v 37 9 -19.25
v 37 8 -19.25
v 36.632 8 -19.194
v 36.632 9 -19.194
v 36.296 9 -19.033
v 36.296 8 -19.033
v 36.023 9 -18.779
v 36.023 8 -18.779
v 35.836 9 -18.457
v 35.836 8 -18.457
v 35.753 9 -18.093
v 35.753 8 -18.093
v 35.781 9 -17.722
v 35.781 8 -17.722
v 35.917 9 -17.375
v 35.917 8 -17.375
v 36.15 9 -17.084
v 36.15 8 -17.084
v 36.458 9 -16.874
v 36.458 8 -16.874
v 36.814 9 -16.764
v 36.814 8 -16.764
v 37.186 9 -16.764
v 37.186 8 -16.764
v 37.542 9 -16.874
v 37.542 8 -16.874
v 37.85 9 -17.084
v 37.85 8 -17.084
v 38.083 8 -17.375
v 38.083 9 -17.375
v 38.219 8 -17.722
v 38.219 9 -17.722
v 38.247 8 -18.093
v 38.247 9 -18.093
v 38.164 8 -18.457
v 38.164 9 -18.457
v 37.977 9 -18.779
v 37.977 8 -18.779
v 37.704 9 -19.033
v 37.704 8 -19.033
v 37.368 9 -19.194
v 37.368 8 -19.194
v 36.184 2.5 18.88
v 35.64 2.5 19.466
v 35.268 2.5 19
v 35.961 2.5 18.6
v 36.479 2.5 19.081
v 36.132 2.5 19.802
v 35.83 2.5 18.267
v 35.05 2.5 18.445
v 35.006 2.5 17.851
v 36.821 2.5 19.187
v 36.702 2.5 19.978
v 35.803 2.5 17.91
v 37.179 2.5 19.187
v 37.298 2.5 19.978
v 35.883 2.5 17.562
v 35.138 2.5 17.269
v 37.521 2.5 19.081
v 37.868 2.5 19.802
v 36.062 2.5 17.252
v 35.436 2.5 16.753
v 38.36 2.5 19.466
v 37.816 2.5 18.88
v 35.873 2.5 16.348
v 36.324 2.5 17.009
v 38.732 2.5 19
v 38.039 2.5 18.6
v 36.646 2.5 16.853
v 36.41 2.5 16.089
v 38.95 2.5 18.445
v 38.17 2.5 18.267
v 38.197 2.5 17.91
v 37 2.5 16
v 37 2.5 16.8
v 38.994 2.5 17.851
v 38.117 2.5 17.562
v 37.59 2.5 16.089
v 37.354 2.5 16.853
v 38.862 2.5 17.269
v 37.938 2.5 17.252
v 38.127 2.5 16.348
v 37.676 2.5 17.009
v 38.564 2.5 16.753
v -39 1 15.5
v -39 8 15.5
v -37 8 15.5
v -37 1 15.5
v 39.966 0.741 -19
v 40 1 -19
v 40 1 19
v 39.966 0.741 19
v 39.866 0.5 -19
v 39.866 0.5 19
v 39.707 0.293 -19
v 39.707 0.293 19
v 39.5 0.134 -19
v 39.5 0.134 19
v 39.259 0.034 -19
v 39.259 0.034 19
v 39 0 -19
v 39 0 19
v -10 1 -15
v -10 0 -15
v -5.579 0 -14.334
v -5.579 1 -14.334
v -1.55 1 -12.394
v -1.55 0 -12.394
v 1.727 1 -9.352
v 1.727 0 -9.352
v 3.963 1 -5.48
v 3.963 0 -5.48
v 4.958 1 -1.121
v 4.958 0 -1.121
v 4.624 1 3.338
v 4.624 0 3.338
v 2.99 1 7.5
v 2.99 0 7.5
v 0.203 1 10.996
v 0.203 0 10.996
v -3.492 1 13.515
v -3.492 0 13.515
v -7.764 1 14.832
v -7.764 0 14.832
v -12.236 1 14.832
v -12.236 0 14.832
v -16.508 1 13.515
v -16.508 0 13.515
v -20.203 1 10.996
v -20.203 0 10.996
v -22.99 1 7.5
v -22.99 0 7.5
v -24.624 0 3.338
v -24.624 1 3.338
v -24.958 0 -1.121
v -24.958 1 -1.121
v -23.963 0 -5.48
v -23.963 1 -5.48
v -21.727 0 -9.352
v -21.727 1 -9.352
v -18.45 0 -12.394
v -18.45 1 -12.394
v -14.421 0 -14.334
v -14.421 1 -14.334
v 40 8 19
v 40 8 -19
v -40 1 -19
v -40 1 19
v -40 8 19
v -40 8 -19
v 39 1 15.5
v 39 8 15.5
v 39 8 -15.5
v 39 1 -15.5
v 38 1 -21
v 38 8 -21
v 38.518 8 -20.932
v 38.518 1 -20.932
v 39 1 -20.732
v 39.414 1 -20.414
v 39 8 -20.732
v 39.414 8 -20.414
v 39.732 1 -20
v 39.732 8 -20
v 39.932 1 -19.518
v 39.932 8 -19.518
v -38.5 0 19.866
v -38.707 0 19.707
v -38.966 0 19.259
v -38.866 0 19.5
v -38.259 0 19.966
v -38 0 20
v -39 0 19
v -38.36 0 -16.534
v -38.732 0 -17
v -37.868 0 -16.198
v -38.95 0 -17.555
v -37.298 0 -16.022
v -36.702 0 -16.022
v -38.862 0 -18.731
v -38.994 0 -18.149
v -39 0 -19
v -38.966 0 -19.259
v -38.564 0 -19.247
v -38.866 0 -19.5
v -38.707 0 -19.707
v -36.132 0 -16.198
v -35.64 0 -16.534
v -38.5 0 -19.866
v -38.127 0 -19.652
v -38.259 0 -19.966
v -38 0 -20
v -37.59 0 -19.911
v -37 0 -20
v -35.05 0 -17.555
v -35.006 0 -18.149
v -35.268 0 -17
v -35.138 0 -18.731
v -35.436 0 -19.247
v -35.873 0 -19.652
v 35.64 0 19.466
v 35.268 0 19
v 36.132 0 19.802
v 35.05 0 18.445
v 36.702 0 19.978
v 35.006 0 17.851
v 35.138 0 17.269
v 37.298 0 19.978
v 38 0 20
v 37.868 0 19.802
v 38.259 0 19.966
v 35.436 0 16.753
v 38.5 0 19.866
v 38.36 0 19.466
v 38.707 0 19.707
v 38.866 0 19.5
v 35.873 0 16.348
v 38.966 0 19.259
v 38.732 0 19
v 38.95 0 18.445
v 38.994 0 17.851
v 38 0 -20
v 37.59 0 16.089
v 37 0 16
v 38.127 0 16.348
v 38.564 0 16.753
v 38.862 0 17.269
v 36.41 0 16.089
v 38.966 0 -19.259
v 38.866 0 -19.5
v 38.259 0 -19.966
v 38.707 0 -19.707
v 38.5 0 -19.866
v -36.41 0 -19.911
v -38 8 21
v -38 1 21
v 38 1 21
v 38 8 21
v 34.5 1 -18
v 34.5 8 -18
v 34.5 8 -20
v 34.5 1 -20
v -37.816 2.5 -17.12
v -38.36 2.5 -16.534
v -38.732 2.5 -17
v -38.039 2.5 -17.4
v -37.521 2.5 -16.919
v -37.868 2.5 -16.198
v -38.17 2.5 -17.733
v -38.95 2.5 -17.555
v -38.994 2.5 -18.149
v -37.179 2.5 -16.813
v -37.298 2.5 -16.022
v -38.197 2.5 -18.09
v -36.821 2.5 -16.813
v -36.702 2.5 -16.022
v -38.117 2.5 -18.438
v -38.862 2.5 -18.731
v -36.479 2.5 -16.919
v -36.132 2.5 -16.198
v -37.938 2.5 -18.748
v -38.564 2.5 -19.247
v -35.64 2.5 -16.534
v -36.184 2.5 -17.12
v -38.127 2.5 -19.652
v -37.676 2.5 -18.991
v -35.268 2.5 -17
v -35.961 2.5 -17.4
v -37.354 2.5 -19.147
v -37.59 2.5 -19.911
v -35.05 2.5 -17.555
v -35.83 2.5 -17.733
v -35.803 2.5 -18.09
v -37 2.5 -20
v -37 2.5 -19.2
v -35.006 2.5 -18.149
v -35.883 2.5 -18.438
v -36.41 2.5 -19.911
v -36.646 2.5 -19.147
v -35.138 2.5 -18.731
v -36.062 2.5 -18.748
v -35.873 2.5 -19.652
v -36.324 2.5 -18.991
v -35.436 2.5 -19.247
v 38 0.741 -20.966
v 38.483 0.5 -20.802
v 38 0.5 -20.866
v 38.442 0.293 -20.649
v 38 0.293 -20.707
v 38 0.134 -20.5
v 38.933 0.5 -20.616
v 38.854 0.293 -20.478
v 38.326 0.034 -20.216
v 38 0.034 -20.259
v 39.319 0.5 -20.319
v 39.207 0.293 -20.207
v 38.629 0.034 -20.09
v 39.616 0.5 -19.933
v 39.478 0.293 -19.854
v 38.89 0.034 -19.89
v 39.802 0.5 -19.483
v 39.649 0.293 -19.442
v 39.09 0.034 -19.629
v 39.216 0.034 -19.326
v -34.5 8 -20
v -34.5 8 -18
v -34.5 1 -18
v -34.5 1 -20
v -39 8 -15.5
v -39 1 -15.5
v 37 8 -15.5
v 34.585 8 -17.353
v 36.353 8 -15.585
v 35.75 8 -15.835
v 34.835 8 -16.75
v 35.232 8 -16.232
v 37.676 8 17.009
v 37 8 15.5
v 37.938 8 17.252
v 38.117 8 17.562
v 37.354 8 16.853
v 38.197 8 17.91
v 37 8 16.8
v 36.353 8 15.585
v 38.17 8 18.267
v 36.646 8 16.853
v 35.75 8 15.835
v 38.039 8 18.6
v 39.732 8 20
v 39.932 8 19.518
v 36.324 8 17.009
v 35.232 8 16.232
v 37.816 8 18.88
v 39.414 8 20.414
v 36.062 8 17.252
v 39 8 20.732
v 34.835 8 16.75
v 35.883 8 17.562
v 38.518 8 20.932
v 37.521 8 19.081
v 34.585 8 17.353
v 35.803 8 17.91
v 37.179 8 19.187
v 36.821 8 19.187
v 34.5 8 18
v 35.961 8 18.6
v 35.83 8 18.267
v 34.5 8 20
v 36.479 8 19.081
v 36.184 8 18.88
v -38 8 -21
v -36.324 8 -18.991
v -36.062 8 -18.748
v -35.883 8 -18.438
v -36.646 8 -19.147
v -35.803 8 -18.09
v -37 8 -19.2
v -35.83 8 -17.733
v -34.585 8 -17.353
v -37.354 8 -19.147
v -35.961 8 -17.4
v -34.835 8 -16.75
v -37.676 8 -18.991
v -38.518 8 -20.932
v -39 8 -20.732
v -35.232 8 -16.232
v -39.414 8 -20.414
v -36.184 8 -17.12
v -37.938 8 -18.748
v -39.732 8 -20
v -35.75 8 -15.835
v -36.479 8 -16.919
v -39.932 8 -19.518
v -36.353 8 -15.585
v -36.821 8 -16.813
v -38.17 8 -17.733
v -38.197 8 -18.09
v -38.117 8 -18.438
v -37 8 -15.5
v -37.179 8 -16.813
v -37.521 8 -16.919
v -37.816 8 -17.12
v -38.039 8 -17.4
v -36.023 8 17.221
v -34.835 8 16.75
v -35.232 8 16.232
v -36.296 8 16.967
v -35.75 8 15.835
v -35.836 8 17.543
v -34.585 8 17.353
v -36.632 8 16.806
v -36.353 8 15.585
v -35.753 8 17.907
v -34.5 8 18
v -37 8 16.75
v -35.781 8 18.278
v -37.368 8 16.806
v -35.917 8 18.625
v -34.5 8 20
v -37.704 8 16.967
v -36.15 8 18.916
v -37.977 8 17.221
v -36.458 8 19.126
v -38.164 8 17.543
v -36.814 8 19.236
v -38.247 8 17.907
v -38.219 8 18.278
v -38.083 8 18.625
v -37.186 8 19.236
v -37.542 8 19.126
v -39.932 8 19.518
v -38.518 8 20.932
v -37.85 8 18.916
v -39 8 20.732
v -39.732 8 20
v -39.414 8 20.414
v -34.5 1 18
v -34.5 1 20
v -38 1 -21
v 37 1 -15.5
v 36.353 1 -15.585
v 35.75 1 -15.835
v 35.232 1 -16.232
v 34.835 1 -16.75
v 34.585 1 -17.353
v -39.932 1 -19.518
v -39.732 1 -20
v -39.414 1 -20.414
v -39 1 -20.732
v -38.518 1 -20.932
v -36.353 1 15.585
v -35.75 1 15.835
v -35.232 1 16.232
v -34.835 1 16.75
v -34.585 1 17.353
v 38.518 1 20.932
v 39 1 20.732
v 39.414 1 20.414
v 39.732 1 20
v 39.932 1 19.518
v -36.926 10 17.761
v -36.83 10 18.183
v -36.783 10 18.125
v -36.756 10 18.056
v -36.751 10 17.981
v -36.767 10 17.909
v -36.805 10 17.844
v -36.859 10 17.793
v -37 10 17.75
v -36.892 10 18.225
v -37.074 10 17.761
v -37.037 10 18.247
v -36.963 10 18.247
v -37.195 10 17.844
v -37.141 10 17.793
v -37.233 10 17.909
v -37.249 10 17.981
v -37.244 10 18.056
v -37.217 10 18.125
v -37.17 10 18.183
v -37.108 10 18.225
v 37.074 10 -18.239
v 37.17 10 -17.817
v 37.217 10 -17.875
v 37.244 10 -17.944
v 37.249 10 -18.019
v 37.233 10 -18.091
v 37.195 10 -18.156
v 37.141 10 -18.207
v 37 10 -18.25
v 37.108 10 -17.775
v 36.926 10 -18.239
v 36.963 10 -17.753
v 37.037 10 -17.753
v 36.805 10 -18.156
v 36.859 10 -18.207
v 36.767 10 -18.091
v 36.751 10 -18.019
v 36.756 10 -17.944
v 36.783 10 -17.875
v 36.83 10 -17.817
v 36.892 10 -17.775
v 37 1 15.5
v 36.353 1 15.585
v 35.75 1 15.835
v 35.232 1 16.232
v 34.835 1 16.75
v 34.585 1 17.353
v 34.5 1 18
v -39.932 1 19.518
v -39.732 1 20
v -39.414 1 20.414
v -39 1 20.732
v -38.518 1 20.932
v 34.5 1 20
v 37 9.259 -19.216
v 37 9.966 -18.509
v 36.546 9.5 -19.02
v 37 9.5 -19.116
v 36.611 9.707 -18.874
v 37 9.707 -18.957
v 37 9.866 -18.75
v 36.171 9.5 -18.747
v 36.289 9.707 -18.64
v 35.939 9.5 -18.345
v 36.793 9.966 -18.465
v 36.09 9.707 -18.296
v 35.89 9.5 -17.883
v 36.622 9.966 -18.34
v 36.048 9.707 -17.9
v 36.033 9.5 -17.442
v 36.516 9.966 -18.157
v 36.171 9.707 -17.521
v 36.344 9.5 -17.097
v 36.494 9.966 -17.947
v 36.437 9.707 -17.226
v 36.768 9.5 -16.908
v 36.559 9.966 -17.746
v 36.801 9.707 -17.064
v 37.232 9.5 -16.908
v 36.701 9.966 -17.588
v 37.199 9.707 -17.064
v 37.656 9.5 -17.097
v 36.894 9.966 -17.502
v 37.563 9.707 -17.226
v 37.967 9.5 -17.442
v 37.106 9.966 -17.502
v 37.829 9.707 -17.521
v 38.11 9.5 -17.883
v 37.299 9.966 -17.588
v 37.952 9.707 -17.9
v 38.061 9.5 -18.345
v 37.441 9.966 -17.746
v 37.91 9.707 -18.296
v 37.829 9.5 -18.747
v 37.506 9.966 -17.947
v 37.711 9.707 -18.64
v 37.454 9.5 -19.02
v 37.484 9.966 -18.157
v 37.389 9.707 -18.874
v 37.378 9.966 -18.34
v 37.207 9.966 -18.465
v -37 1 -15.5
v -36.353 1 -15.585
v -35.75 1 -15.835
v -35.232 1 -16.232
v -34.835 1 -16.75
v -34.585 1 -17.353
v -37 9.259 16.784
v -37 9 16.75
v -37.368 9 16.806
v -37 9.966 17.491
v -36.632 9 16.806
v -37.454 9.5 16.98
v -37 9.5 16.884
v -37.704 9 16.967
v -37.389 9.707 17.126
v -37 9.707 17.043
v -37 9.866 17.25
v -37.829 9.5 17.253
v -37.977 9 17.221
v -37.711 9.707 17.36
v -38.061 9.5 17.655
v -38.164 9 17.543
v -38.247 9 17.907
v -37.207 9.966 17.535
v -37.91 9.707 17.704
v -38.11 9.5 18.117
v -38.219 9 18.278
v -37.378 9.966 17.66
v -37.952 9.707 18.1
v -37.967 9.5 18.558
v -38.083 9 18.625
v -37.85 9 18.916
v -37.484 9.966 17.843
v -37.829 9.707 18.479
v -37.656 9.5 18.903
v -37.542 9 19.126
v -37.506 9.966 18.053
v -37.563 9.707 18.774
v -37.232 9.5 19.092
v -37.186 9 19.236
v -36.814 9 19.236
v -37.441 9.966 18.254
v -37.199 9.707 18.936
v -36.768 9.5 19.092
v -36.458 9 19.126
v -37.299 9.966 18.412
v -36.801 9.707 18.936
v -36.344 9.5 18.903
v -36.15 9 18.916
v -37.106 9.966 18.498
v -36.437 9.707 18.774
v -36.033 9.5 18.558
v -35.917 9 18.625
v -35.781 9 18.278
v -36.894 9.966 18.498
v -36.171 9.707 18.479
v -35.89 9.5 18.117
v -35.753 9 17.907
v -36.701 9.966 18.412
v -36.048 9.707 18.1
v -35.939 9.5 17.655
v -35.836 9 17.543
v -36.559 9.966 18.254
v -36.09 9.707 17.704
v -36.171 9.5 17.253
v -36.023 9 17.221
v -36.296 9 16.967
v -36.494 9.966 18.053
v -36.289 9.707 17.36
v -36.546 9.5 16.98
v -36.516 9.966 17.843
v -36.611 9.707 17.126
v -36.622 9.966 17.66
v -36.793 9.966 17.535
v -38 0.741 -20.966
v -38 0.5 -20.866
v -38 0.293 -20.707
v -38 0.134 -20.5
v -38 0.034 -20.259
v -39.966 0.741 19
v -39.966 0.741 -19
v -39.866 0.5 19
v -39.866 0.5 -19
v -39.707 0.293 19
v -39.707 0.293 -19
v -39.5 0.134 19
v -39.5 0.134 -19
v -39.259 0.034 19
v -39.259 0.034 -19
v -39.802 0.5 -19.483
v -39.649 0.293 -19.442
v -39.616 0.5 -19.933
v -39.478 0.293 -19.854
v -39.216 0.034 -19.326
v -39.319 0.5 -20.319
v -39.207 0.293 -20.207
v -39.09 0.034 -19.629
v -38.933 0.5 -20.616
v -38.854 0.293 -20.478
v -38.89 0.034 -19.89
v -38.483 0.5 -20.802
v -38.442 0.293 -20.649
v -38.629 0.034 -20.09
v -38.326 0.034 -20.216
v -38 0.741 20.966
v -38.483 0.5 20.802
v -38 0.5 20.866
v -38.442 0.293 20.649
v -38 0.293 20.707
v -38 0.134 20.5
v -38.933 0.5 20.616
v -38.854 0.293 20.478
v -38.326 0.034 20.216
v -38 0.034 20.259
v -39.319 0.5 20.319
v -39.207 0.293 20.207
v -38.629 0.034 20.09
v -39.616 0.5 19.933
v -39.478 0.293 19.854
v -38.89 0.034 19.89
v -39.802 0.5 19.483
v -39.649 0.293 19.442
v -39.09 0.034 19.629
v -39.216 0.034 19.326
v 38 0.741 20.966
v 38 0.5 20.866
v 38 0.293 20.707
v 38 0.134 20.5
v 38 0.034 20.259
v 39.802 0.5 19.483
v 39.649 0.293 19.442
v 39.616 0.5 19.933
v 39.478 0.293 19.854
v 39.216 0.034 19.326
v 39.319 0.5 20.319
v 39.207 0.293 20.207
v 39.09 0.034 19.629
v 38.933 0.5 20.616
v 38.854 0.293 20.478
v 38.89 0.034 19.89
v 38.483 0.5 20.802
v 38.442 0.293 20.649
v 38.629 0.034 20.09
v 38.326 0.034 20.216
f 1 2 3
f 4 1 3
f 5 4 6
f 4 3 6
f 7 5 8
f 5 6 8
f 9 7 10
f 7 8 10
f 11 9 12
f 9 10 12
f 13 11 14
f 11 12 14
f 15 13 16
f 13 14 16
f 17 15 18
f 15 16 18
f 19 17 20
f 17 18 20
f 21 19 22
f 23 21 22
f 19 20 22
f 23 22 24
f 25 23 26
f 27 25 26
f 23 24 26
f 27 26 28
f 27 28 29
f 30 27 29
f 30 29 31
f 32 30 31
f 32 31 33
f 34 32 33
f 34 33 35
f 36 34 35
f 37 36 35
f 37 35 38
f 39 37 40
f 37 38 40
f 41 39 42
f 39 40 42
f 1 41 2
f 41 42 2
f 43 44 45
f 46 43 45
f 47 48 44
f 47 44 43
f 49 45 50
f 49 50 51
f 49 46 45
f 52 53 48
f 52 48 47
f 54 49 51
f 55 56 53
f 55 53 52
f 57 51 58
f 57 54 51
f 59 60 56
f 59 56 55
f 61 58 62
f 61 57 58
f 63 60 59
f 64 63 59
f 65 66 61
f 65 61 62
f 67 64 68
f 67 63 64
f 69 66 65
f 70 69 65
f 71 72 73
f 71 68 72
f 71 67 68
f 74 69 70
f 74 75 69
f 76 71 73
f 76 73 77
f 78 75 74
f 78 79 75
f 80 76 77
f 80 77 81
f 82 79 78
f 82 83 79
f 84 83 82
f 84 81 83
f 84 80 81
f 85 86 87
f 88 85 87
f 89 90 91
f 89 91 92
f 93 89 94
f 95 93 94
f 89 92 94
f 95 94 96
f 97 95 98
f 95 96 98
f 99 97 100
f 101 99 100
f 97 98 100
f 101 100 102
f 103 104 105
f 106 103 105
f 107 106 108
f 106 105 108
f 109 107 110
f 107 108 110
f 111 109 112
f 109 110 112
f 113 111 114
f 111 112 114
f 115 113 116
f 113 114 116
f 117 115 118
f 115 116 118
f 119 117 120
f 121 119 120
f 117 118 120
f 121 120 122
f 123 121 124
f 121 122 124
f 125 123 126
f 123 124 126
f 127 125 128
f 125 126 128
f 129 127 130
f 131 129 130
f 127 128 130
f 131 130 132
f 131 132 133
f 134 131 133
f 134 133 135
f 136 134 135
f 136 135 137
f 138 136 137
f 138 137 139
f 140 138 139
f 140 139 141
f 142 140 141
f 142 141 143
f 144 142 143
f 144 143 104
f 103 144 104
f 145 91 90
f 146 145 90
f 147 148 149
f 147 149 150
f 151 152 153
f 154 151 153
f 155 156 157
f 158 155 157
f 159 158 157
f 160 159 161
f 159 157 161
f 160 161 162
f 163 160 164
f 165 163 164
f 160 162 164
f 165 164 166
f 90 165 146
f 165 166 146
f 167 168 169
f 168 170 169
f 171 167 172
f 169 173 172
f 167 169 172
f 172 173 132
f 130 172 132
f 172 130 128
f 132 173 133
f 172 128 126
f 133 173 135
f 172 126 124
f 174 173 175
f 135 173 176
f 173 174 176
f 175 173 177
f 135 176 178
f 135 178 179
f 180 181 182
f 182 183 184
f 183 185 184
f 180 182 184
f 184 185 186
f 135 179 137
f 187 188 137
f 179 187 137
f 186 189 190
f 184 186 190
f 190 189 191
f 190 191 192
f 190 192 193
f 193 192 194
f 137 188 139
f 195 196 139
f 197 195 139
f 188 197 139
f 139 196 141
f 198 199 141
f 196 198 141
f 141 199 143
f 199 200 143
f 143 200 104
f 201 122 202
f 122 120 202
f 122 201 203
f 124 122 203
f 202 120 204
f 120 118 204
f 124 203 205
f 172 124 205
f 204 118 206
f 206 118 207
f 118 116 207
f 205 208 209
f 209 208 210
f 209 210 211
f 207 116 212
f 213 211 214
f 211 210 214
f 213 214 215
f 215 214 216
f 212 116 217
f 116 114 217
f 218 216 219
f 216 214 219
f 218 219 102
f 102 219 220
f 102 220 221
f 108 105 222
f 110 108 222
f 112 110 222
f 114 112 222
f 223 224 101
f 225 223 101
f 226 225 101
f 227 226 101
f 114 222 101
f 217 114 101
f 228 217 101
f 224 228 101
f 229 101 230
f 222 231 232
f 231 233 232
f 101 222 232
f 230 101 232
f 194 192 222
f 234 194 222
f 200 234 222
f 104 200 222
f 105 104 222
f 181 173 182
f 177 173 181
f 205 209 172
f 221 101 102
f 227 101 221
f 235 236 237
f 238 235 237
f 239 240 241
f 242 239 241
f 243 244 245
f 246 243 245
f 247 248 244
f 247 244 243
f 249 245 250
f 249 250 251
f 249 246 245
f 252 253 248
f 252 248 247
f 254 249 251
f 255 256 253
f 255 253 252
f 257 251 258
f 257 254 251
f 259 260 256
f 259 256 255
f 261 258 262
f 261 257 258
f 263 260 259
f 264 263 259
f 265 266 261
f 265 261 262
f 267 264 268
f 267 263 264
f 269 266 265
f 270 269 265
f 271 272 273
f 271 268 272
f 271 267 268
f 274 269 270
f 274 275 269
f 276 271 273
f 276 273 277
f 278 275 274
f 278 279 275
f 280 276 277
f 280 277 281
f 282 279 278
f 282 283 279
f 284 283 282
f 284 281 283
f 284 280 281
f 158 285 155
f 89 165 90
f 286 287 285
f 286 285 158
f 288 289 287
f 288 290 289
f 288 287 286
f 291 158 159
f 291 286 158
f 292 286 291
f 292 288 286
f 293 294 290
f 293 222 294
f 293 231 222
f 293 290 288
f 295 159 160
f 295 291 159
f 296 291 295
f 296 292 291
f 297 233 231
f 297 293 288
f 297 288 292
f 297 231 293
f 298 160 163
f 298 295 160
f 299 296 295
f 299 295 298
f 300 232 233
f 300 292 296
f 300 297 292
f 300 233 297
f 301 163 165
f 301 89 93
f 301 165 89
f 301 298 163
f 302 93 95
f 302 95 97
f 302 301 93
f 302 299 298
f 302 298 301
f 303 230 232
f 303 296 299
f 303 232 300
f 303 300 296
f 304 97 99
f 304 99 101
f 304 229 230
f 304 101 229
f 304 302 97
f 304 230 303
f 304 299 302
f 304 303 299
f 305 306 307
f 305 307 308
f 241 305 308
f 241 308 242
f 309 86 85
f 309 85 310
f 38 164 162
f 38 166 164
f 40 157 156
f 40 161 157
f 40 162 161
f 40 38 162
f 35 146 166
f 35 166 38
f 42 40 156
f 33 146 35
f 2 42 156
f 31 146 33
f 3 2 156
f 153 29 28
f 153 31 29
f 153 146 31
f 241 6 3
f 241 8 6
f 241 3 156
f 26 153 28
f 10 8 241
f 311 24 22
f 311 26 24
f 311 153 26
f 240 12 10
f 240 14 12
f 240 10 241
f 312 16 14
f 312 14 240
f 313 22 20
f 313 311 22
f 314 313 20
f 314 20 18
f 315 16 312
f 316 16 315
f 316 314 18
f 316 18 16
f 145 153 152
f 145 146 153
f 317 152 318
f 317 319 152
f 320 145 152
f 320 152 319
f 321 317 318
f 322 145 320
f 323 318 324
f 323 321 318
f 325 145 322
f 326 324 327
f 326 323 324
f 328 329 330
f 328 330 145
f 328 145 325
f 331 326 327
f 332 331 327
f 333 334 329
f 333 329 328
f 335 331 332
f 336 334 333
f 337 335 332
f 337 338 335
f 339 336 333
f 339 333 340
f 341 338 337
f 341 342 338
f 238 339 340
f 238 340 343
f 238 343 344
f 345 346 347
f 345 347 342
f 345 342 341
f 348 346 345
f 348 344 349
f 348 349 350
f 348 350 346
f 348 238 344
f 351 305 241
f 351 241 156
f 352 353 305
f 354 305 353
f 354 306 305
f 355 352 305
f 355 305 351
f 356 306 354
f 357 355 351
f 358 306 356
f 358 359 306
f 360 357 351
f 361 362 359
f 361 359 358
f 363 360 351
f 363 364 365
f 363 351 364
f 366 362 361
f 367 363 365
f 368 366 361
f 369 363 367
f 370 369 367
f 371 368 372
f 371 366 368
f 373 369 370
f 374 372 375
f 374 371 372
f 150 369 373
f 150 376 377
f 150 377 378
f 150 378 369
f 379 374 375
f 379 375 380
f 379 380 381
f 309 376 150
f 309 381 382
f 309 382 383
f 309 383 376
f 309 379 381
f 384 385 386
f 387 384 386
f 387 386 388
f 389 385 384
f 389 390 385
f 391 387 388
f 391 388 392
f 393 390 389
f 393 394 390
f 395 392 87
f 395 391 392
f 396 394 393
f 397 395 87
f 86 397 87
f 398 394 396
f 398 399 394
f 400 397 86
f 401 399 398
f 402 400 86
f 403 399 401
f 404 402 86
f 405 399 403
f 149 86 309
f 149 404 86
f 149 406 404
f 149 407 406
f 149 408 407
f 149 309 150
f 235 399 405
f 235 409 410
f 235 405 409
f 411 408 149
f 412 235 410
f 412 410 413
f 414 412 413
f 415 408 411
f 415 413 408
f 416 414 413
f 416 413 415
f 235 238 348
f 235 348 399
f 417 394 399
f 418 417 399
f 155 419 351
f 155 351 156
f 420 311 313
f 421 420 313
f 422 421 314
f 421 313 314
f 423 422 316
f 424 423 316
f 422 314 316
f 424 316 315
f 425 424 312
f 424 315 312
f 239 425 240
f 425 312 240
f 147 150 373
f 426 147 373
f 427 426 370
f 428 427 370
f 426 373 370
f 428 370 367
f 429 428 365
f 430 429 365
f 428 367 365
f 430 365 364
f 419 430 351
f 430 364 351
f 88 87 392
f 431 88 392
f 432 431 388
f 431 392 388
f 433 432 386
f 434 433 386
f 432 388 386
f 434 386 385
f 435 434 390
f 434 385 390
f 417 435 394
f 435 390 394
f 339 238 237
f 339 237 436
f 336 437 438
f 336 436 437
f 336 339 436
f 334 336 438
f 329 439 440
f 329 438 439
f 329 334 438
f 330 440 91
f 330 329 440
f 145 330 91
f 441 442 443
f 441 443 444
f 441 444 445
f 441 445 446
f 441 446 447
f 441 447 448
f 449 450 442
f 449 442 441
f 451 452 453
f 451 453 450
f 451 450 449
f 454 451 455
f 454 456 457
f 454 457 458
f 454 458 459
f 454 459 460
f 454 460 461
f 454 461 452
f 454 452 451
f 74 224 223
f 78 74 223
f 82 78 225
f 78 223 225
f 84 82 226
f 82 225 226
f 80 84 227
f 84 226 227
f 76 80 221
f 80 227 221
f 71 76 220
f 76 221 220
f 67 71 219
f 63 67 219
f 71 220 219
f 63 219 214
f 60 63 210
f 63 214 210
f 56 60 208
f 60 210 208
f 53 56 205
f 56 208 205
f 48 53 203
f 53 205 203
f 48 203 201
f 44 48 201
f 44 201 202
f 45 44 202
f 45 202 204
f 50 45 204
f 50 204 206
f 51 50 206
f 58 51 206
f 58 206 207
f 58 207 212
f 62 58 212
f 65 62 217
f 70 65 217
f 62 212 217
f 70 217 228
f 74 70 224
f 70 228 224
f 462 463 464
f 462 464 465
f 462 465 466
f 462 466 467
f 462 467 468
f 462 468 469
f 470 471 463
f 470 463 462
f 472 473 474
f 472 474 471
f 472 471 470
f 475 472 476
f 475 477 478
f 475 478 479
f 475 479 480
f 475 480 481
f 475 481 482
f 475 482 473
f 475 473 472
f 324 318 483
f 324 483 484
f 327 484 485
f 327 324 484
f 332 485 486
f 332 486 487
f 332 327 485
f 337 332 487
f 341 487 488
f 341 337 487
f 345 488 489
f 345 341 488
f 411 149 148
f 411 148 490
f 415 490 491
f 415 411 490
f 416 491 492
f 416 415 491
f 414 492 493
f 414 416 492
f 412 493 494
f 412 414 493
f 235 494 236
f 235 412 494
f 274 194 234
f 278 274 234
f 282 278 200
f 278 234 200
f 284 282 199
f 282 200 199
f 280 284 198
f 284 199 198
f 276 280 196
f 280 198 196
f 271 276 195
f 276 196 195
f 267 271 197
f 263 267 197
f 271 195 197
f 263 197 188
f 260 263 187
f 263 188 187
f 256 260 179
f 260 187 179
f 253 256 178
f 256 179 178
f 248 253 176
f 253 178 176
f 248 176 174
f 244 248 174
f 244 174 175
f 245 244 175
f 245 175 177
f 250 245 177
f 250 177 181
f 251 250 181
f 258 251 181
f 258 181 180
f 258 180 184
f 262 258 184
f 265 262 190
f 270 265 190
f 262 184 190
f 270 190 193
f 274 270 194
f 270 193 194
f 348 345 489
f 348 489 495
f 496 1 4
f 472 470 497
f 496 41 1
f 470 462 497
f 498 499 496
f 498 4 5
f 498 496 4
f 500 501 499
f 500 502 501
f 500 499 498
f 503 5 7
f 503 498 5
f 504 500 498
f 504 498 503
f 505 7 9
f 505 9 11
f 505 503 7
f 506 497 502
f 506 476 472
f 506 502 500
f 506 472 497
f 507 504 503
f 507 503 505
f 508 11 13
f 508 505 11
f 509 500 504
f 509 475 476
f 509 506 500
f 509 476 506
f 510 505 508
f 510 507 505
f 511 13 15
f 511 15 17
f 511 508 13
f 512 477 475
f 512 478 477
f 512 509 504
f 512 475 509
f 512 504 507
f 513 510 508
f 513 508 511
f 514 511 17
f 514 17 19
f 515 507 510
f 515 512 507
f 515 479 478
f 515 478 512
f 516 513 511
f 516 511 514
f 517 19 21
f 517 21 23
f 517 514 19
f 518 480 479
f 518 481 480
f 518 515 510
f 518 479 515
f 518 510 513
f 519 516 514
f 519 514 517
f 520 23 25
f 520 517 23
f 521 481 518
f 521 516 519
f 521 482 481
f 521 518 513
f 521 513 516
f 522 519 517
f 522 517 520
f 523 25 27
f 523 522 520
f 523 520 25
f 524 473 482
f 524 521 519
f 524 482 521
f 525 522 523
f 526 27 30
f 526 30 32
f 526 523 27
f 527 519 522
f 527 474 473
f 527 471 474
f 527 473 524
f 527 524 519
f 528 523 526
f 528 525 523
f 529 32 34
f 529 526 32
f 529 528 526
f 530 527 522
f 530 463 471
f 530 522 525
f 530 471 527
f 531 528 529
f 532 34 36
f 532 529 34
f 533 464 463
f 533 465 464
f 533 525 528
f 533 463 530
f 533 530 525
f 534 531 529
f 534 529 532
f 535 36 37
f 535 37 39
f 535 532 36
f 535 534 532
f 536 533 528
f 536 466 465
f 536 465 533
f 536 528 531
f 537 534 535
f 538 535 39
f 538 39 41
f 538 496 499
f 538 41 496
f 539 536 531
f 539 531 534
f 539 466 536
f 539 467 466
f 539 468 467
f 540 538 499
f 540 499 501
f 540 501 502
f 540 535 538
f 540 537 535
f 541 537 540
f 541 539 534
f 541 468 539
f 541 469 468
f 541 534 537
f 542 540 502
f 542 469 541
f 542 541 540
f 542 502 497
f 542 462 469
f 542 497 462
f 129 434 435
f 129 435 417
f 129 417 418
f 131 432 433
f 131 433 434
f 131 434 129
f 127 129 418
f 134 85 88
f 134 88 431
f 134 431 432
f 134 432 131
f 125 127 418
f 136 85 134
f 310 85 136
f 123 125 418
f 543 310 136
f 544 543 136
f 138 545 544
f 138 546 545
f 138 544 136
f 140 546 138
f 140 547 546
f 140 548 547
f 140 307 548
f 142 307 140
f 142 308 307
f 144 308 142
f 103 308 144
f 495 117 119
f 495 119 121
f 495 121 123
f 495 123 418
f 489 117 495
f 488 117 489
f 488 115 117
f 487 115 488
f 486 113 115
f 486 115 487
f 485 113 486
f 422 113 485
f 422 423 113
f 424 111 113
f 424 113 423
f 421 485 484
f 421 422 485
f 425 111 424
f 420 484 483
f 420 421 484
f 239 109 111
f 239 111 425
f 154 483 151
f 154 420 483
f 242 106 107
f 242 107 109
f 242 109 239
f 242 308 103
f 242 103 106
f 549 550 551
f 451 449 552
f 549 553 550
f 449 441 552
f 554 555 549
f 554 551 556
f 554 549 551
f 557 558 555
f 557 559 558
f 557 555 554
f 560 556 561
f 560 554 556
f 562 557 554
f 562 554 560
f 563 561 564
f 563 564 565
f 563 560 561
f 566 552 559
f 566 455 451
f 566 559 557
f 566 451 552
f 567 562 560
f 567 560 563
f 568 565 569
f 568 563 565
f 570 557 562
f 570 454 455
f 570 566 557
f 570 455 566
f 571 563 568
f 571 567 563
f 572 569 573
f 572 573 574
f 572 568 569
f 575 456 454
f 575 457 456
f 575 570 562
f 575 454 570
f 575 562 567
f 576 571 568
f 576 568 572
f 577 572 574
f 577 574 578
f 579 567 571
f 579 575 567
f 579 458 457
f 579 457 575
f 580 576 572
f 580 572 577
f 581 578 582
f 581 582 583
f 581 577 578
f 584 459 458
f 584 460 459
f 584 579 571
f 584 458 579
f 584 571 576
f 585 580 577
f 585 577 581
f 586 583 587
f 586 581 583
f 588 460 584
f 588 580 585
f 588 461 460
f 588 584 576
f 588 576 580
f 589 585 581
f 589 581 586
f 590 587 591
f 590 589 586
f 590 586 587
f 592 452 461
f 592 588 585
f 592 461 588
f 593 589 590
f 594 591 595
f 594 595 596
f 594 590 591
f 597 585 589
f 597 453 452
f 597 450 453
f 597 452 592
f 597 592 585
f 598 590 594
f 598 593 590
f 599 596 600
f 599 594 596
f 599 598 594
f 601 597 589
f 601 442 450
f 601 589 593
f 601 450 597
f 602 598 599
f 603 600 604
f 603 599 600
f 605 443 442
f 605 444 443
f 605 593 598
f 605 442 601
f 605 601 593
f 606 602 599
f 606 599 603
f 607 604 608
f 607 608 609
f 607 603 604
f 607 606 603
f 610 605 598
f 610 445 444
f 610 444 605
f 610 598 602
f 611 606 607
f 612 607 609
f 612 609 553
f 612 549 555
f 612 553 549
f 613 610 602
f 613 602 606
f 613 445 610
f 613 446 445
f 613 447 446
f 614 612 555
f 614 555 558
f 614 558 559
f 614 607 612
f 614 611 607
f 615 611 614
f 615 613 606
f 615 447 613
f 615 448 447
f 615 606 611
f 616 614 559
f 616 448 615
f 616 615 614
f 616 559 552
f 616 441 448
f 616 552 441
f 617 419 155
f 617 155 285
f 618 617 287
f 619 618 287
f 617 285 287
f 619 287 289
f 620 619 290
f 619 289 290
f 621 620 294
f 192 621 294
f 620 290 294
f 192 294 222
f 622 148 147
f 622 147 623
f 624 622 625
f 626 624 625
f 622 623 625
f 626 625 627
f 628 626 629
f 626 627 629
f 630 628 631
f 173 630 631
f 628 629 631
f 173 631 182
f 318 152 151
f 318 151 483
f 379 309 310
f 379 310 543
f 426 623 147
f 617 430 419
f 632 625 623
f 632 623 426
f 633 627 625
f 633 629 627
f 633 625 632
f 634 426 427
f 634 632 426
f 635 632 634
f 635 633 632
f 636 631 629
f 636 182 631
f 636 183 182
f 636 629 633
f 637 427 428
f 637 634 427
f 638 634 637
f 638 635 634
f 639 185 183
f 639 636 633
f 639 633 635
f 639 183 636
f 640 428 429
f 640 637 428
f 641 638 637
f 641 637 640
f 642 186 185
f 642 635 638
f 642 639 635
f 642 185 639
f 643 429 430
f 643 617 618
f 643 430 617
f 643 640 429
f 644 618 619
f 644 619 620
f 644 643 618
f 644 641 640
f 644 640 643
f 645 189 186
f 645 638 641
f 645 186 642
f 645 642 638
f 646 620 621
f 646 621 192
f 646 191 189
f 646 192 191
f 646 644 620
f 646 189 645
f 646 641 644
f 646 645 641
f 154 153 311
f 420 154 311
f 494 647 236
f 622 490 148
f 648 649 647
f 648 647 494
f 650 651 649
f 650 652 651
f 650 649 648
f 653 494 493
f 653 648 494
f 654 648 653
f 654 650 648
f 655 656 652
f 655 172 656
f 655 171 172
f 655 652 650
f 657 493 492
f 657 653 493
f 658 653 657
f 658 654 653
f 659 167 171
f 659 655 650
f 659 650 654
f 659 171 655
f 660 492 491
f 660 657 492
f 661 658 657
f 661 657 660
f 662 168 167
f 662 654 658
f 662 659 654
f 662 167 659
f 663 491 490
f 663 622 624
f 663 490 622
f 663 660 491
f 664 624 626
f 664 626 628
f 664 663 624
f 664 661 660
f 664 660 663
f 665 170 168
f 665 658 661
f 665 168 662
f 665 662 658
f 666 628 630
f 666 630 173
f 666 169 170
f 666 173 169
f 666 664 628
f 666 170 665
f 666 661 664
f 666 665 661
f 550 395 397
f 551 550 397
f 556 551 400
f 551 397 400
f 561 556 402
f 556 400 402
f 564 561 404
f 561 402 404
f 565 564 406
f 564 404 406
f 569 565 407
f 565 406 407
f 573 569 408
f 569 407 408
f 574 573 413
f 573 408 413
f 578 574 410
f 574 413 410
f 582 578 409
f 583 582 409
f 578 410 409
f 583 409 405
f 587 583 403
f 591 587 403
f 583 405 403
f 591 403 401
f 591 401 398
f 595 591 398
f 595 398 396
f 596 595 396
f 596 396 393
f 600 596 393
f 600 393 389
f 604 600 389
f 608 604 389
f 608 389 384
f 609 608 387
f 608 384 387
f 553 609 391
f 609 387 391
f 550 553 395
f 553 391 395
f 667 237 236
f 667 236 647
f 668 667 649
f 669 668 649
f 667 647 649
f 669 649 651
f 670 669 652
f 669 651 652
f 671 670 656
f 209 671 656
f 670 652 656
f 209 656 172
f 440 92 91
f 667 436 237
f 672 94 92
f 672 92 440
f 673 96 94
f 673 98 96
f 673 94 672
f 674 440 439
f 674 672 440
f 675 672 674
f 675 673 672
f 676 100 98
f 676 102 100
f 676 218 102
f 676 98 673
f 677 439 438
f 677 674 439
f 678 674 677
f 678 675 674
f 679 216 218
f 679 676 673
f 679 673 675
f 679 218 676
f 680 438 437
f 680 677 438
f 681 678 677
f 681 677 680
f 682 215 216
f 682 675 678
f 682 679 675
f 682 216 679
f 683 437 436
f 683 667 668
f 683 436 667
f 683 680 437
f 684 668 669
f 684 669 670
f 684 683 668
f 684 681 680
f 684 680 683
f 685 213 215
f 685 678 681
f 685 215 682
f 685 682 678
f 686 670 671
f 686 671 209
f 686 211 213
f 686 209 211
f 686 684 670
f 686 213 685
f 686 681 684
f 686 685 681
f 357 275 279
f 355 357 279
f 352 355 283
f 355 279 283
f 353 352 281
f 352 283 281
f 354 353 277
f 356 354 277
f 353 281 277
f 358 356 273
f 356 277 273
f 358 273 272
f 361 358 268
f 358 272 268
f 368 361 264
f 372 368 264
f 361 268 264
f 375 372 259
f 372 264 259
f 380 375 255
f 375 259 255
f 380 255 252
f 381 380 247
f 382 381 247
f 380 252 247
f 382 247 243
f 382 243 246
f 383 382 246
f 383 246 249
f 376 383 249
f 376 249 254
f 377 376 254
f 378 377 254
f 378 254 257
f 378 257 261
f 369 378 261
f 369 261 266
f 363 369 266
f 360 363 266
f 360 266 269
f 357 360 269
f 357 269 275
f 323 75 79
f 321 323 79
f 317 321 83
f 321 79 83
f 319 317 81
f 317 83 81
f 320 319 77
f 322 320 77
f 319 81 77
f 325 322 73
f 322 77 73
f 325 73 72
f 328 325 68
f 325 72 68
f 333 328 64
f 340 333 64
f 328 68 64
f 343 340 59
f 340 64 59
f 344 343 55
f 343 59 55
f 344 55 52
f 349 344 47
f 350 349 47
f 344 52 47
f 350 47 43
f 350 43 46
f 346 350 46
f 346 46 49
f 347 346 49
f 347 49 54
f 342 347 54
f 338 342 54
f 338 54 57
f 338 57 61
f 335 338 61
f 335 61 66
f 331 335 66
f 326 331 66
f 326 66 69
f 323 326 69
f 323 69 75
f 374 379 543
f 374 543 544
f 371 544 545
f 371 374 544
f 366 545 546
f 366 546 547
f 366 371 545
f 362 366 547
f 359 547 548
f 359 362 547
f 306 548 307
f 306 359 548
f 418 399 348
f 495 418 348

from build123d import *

# Parameters (mm, degrees)
SKETCH1_W                                = 80
SKETCH1_H                                = 42
BOSS_EXTRUDE1_DEPTH                      = 8
SKETCH2_W                                = 78
SKETCH2_H                                = 40
CUT_EXTRUDE1_DEPTH                       = 7
FILLET1_R                                = 2
BOSS_EXTRUDE2_REACH                      = 47.88
MIRROR1_AT_THE_SECOND_PLANE_COPY_1_REACH = 47.88
M2_CLEARANCE_HOLE2_D                     = 2.4
SKETCH9_R                                = 2
CUT_EXTRUDE2_DEPTH                       = 2.5
SKETCH11_R                               = 1.25
BOSS_EXTRUDE3_DEPTH                      = 2
FILLET2_R                                = 1
FILLET3_R                                = 1
CUT_EXTRUDE3_REACH                       = 48.271
SKETCH12_R                               = 15


with BuildPart() as part:
    # Sketch1 → Boss-Extrude1 (new body)
    with BuildSketch(Plane(origin=(0, 0, 0), x_dir=(1, 0, 0), z_dir=(0, 1, 0))):
        Rectangle(SKETCH1_W, SKETCH1_H)
    extrude(amount=BOSS_EXTRUDE1_DEPTH)

    # Sketch2 → Cut-Extrude1 (cut)
    with BuildSketch(Plane(origin=(0, 8, 0), x_dir=(1, 0, 0), z_dir=(0, 1, 0))):
        Rectangle(SKETCH2_W, SKETCH2_H)
    extrude(amount=-CUT_EXTRUDE1_DEPTH, mode=Mode.SUBTRACT)

    # Fillet1
    fillet1_edges = [part.edges().sort_by_distance(p)[0] for p in [
        (-39, 4.5, -20),
        (-39, 4.5, 20),
        (39, 4.5, 20),
        (39, 4.5, -20),
        (40, 4, 21),
        (-40, 4, 21),
        (-40, 4, -21),
        (40, 4, -21),
    ]]
    fillet(fillet1_edges, radius=FILLET1_R)

    # Sketch3 → Boss-Extrude2 (add, up to next)
    with BuildSketch(Plane(origin=(0, 8, 0), x_dir=(1, 0, 0), z_dir=(0, 1, 0)), mode=Mode.PRIVATE) as boss_extrude2_sk1:
        with BuildLine():
            Line((-34.5, 18), (-34.5, 20))
            Line((-34.5, 20), (-37, 20))
            ThreePointArc((-37, 20), (-38.414213562, 19.414213562), (-39, 18))
            Line((-39, 18), (-39, 15.5))
            Line((-39, 15.5), (-37, 15.5))
            ThreePointArc((-37, 15.5), (-35.232233047, 16.232233047), (-34.5, 18))
        make_face()
    boss_extrude2_tool1 = extrude(boss_extrude2_sk1.sketch, amount=-BOSS_EXTRUDE2_REACH, mode=Mode.PRIVATE) - part.part
    boss_extrude2 = boss_extrude2_tool1.solids().sort_by_distance((-36.789939, 8, -17.789939))[0]
    add(boss_extrude2)

    # Mirror1: Boss-Extrude2 across plane
    add(boss_extrude2.mirror(Plane.XY))

    # Mirror1 at the second plane: Boss-Extrude2 across plane
    add(boss_extrude2.mirror(Plane(origin=(0, 0, 0), x_dir=(0, 0, 1), z_dir=(1, 0, 0))))

    # Mirror1 at the second plane copy 1 sketc → Mirror1 at the second plane copy 1 (add, up to next)
    with BuildSketch(Plane(origin=(0, 8, 0), x_dir=(-1, 0, 0), z_dir=(0, 1, 0)), mode=Mode.PRIVATE) as mirror1_at_the_second_plane_copy_1_sk1:
        with BuildLine():
            Line((-34.5, 18), (-34.5, 20))
            Line((-34.5, 20), (-37, 20))
            ThreePointArc((-37, 20), (-38.414213562, 19.414213562), (-39, 18))
            Line((-39, 18), (-39, 15.5))
            Line((-39, 15.5), (-37, 15.5))
            ThreePointArc((-37, 15.5), (-35.232233047, 16.232233047), (-34.5, 18))
        make_face()
    mirror1_at_the_second_plane_copy_1_tool1 = extrude(mirror1_at_the_second_plane_copy_1_sk1.sketch, amount=-MIRROR1_AT_THE_SECOND_PLANE_COPY_1_REACH, mode=Mode.PRIVATE) - part.part
    add(mirror1_at_the_second_plane_copy_1_tool1.solids().sort_by_distance((36.789939, 8, 17.789939))[0])

    # M2 Clearance Hole2 (through all)
    with Locations(Plane(origin=(-37, 8, -18), x_dir=(0, 0, 1), z_dir=(0, 1, 0))):
        with Locations((0, 0), (36, 74)):
            Hole(M2_CLEARANCE_HOLE2_D / 2)

    # Sketch9 → Cut-Extrude2 (cut)
    with BuildSketch(Plane.XZ):
        with Locations(Location((-37, -18, 0), (0, 0, 270))):
            Circle(SKETCH9_R)
        with Locations(Location((37, 18, 0), (0, 0, 270))):
            Circle(SKETCH9_R)
    extrude(amount=-CUT_EXTRUDE2_DEPTH, mode=Mode.SUBTRACT)

    # Sketch11 → Boss-Extrude3 (add)
    with BuildSketch(Plane(origin=(0, 8, 0), x_dir=(1, 0, 0), z_dir=(0, 1, 0))):
        with Locations(Location((-37, -18, 0), (0, 0, 90))):
            Circle(SKETCH11_R)
        with Locations(Location((37, 18, 0), (0, 0, 90))):
            Circle(SKETCH11_R)
    extrude(amount=BOSS_EXTRUDE3_DEPTH)

    # Fillet2
    fillet2_edges = [part.edges().sort_by_distance(p)[0] for p in [
        (-37, 10, 19.25),
        (37, 10, -16.75),
    ]]
    fillet(fillet2_edges, radius=FILLET2_R)

    # Fillet3
    fillet3_edges = [part.edges().sort_by_distance(p)[0] for p in [
        (0, 0, -21),
        (40, 0, 0),
        (0, 0, 21),
        (-40, 0, 0),
        (-39.414213562, 0, -20.414213562),
        (-39.414213562, 0, 20.414213562),
        (39.414213562, 0, 20.414213562),
        (39.414213562, 0, -20.414213562),
    ]]
    fillet(fillet3_edges, radius=FILLET3_R - 0.0001)  # a hair under: the kernel refuses the full size

    # Sketch12 → Cut-Extrude3 (cut, up to next)
    with BuildSketch(Plane.XZ, mode=Mode.PRIVATE) as cut_extrude3_sk1:
        with Locations(Location((-10, 0, 0), (0, 0, 270))):
            Circle(SKETCH12_R)
    cut_extrude3_tool1 = extrude(cut_extrude3_sk1.sketch, amount=-CUT_EXTRUDE3_REACH, mode=Mode.PRIVATE) & part.part
    add(cut_extrude3_tool1.solids().sort_by_distance((-10, 0, 0))[0], mode=Mode.SUBTRACT)


solid = part.part
